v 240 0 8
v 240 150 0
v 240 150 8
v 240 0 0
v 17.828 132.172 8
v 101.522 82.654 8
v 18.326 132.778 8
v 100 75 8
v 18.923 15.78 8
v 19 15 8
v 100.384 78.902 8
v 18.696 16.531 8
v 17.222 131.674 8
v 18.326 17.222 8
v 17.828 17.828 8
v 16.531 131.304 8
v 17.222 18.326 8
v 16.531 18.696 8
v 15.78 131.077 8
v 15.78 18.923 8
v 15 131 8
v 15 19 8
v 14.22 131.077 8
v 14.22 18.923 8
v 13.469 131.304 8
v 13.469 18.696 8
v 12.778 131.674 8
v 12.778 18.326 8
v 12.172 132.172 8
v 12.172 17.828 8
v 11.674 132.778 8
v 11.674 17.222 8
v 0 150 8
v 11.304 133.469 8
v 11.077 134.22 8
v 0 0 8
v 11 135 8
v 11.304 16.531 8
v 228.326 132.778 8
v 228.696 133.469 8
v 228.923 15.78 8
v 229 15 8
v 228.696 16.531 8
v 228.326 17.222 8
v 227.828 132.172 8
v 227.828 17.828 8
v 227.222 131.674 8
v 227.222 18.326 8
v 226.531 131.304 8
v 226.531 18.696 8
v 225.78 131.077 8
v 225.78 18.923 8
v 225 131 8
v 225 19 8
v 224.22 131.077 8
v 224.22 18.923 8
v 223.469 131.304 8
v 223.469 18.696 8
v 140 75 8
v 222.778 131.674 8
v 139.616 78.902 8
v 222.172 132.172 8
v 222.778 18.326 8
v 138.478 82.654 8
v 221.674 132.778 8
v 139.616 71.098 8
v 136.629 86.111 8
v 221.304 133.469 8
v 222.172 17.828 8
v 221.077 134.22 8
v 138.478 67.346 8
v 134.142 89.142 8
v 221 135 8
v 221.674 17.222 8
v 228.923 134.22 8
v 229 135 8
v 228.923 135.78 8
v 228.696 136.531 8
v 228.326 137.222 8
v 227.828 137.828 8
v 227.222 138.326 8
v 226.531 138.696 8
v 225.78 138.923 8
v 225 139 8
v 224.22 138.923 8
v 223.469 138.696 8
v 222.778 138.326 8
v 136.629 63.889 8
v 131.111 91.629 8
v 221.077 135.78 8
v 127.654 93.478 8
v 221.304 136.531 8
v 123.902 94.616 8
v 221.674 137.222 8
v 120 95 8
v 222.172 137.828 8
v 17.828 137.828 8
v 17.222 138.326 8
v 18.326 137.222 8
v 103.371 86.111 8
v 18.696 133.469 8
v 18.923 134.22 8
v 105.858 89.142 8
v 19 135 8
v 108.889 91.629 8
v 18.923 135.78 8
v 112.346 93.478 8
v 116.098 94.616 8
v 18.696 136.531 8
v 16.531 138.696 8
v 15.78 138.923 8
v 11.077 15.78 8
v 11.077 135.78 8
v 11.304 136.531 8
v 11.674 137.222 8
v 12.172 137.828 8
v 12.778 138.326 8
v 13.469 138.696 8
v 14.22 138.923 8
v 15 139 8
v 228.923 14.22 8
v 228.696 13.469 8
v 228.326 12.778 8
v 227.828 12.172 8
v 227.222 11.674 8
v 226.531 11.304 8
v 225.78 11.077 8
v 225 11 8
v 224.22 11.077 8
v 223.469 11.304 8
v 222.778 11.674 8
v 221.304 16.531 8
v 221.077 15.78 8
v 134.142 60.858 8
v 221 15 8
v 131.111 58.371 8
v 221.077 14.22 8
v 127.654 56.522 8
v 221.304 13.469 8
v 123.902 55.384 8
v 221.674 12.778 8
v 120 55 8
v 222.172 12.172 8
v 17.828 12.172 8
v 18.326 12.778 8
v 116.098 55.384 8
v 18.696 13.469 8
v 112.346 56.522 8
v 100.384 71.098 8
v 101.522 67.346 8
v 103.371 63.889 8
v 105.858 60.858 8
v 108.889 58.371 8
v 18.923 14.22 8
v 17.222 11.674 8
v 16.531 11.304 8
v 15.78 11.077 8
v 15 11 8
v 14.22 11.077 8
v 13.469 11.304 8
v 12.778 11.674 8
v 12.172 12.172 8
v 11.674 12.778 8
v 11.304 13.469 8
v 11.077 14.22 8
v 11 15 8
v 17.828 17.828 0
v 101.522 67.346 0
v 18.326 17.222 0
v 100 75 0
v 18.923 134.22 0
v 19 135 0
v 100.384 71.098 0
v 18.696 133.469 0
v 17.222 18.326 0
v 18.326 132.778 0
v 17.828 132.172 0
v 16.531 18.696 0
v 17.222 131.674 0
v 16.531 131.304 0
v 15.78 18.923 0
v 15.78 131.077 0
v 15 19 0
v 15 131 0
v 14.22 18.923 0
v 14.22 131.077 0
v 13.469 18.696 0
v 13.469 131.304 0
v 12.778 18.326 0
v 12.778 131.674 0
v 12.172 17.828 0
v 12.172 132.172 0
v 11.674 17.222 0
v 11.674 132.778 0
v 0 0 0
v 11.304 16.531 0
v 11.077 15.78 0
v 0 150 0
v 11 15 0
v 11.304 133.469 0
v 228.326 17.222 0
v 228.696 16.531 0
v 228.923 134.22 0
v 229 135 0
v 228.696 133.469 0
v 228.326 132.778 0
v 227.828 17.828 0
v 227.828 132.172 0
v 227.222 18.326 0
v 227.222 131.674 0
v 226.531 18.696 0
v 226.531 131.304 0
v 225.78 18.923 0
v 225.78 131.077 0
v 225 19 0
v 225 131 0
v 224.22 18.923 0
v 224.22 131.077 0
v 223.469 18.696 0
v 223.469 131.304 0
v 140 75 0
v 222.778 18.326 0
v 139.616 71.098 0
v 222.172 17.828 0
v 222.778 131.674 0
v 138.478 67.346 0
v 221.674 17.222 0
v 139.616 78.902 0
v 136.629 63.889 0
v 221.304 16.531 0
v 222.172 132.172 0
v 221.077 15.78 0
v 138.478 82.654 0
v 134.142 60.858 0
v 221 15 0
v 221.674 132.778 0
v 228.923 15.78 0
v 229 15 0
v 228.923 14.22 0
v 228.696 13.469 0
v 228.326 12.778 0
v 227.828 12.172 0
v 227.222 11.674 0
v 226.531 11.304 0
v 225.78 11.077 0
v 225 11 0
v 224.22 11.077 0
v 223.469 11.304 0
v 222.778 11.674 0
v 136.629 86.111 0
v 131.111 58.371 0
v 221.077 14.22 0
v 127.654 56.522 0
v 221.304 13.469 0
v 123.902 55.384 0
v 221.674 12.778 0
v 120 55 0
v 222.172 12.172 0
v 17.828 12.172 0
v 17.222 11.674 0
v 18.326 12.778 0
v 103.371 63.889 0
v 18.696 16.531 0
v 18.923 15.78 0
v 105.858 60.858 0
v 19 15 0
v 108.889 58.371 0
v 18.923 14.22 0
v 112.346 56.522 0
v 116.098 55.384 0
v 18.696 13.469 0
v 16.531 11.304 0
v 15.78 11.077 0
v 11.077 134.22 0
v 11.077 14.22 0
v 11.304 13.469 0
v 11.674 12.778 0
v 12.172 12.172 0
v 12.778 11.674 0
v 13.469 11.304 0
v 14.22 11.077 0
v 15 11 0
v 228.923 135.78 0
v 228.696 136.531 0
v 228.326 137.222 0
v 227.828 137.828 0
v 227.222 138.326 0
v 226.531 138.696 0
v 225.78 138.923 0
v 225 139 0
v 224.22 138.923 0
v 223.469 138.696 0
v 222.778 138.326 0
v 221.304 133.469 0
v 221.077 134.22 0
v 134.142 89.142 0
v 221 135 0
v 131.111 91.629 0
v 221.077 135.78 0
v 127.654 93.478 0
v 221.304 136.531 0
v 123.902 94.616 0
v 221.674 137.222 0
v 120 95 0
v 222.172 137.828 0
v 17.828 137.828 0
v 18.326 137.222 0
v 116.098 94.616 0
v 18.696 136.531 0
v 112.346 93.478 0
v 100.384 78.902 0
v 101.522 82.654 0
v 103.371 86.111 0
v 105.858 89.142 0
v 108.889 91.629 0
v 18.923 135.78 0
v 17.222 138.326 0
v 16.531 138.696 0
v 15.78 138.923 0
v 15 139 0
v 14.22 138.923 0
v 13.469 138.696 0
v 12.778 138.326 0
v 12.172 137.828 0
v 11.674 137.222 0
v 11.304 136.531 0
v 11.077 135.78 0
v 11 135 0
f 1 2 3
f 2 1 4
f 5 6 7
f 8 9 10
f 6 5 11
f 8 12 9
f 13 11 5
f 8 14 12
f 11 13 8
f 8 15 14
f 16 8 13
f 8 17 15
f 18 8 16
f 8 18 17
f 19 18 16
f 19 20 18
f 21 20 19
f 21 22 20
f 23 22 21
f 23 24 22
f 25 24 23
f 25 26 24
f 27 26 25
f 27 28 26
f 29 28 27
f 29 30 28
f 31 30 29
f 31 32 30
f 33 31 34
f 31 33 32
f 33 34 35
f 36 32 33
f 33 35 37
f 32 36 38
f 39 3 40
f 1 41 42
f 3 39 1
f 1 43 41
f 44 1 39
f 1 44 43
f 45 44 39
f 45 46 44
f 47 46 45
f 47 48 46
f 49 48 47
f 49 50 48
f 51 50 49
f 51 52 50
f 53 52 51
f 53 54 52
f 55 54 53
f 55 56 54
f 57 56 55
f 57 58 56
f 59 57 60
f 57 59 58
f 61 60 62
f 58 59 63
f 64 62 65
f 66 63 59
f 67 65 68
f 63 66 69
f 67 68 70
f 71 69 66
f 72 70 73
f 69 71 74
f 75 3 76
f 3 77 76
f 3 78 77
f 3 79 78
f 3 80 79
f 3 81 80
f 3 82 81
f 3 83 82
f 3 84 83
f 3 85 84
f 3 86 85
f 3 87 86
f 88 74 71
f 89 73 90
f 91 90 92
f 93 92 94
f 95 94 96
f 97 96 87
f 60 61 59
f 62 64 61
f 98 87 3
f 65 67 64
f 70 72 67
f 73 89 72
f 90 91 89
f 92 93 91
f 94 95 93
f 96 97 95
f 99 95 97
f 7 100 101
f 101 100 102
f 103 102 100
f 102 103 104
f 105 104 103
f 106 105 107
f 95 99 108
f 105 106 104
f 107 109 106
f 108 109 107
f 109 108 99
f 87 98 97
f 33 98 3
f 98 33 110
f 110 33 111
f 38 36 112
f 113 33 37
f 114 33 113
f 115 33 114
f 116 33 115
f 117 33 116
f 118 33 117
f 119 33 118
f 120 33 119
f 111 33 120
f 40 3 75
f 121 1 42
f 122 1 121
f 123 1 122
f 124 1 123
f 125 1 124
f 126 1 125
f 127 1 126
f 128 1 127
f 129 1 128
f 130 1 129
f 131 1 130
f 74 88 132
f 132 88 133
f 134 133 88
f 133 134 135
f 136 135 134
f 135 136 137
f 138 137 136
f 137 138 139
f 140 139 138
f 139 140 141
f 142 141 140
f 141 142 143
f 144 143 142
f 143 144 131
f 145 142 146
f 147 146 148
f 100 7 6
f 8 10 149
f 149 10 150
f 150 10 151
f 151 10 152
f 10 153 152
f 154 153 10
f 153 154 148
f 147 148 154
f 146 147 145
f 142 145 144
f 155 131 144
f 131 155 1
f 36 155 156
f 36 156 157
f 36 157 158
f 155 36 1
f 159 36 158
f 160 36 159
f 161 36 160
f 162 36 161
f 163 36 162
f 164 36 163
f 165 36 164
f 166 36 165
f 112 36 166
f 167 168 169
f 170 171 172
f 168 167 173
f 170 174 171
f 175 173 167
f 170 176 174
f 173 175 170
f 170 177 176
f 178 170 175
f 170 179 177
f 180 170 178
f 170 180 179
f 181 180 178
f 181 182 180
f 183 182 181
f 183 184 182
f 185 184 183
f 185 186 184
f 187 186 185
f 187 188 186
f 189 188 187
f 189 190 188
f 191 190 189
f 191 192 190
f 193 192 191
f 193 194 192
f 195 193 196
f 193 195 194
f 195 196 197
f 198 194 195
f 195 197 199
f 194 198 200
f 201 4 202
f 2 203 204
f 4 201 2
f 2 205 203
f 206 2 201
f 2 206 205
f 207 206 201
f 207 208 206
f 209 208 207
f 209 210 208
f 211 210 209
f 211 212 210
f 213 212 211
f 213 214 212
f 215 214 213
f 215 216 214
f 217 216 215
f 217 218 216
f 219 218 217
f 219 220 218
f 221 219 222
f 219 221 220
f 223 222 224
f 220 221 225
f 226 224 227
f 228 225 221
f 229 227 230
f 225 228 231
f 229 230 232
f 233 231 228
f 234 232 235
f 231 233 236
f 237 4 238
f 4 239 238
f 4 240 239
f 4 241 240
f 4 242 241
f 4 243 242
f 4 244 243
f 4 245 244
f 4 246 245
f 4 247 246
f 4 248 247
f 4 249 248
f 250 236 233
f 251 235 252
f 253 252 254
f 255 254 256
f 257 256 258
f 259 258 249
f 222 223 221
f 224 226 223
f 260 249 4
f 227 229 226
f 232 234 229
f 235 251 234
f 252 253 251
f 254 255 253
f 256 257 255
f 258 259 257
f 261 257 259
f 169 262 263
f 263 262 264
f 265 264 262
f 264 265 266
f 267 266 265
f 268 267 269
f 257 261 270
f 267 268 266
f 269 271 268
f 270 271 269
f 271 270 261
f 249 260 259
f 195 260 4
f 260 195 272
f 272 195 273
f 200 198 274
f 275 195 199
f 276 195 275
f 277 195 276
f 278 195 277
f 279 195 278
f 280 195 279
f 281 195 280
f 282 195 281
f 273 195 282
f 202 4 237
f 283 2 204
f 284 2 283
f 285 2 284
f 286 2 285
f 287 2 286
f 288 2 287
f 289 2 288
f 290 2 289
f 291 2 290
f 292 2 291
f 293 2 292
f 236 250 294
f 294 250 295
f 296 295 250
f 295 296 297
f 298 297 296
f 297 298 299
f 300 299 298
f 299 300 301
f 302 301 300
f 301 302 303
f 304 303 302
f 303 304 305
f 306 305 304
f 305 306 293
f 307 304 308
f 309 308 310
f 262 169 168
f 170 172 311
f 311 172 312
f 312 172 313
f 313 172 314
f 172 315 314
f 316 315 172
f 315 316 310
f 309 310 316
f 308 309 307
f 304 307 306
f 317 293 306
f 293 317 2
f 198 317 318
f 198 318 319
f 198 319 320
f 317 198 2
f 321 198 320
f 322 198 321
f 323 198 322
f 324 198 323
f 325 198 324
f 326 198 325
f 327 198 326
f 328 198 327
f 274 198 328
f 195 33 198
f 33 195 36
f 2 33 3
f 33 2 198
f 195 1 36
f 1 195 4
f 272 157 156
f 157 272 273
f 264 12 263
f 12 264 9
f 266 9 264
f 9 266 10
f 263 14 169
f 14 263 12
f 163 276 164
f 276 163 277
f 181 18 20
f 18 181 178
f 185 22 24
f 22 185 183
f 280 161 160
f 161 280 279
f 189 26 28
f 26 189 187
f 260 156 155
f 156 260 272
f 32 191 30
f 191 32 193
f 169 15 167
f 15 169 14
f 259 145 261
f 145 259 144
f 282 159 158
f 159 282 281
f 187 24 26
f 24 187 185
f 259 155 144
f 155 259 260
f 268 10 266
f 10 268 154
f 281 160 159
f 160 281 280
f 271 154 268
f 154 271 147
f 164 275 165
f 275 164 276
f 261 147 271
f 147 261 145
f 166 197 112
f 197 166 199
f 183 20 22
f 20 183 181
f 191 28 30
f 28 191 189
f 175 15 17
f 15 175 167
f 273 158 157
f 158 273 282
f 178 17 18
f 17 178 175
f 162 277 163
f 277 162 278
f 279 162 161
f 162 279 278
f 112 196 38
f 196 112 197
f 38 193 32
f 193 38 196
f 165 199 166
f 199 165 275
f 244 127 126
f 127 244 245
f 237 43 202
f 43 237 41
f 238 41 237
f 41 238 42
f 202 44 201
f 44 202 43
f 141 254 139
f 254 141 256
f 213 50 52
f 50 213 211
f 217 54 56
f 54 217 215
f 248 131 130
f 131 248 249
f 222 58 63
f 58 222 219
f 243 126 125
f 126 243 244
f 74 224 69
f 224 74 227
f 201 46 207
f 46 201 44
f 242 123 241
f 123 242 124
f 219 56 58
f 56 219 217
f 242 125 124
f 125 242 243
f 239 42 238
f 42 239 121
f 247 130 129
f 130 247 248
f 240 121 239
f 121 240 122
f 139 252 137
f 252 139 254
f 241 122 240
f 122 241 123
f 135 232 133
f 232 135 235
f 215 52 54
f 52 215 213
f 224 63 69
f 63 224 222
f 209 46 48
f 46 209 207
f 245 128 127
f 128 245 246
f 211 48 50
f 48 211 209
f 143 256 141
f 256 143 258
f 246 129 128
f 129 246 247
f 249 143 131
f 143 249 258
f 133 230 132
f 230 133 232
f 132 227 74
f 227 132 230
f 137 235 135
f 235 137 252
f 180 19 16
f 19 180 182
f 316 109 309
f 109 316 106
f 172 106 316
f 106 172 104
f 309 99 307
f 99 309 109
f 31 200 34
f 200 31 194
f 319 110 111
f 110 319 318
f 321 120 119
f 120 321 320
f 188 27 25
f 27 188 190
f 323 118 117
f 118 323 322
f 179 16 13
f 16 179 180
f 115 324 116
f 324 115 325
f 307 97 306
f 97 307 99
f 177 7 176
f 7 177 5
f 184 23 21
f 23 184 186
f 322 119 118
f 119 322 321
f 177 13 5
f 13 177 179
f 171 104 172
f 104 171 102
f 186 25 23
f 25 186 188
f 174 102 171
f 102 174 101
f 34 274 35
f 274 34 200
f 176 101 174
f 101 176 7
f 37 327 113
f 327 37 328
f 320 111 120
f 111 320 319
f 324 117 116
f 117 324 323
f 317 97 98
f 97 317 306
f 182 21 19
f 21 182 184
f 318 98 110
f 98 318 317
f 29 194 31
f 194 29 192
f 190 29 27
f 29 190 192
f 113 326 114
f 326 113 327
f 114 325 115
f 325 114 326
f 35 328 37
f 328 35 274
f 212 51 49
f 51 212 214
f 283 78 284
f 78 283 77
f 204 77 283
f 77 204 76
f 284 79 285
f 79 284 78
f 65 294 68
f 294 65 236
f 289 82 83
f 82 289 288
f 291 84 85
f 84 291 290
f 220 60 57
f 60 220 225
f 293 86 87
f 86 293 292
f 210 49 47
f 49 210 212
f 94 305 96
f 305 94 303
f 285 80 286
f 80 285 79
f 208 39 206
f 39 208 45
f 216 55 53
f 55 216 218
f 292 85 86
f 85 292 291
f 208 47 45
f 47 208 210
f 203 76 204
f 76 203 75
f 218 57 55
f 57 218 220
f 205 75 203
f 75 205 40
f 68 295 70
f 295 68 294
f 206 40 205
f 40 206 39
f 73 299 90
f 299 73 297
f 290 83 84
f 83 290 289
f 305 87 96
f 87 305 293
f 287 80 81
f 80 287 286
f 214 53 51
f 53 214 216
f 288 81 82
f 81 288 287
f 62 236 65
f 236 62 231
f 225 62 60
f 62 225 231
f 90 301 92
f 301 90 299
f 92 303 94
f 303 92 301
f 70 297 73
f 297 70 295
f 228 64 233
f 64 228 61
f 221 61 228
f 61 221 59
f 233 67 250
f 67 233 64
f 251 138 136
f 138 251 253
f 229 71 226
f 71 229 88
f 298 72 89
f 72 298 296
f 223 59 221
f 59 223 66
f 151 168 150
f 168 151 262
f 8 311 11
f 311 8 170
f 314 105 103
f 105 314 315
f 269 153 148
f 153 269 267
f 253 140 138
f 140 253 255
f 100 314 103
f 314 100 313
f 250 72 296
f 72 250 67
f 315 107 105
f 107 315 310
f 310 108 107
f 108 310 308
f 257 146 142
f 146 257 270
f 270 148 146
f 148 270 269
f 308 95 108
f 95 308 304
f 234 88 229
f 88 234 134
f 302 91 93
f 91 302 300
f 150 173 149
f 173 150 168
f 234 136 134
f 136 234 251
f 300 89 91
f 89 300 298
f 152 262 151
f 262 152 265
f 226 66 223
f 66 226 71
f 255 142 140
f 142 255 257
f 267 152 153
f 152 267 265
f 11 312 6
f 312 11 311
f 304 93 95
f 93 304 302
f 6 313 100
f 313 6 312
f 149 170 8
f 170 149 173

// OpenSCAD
$fn = 32;

// ----------------------------------------------------------------------
// Big plate: 200-250 mm adapter plate
// ----------------------------------------------------------------------

// --- parameters (mm) ---
plate_l = 240;            // plate length, X
plate_w = 150;            // plate width, Y
plate_t = 8;              // plate thickness, Z
corner_d = 8;             // corner hole diameter
corner_in = 15;           // corner hole inset from the edges
bore_d = 40;              // central bore

difference() {
  cube([plate_l, plate_w, plate_t]);
  translate([corner_in, corner_in, -1]) cylinder(h = plate_t + 2, d = corner_d);
  translate([plate_l - corner_in, corner_in, -1]) cylinder(h = plate_t + 2, d = corner_d);
  translate([corner_in, plate_w - corner_in, -1]) cylinder(h = plate_t + 2, d = corner_d);
  translate([plate_l - corner_in, plate_w - corner_in, -1]) cylinder(h = plate_t + 2, d = corner_d);
  translate([plate_l / 2, plate_w / 2, -1]) cylinder(h = plate_t + 2, d = bore_d);
}
